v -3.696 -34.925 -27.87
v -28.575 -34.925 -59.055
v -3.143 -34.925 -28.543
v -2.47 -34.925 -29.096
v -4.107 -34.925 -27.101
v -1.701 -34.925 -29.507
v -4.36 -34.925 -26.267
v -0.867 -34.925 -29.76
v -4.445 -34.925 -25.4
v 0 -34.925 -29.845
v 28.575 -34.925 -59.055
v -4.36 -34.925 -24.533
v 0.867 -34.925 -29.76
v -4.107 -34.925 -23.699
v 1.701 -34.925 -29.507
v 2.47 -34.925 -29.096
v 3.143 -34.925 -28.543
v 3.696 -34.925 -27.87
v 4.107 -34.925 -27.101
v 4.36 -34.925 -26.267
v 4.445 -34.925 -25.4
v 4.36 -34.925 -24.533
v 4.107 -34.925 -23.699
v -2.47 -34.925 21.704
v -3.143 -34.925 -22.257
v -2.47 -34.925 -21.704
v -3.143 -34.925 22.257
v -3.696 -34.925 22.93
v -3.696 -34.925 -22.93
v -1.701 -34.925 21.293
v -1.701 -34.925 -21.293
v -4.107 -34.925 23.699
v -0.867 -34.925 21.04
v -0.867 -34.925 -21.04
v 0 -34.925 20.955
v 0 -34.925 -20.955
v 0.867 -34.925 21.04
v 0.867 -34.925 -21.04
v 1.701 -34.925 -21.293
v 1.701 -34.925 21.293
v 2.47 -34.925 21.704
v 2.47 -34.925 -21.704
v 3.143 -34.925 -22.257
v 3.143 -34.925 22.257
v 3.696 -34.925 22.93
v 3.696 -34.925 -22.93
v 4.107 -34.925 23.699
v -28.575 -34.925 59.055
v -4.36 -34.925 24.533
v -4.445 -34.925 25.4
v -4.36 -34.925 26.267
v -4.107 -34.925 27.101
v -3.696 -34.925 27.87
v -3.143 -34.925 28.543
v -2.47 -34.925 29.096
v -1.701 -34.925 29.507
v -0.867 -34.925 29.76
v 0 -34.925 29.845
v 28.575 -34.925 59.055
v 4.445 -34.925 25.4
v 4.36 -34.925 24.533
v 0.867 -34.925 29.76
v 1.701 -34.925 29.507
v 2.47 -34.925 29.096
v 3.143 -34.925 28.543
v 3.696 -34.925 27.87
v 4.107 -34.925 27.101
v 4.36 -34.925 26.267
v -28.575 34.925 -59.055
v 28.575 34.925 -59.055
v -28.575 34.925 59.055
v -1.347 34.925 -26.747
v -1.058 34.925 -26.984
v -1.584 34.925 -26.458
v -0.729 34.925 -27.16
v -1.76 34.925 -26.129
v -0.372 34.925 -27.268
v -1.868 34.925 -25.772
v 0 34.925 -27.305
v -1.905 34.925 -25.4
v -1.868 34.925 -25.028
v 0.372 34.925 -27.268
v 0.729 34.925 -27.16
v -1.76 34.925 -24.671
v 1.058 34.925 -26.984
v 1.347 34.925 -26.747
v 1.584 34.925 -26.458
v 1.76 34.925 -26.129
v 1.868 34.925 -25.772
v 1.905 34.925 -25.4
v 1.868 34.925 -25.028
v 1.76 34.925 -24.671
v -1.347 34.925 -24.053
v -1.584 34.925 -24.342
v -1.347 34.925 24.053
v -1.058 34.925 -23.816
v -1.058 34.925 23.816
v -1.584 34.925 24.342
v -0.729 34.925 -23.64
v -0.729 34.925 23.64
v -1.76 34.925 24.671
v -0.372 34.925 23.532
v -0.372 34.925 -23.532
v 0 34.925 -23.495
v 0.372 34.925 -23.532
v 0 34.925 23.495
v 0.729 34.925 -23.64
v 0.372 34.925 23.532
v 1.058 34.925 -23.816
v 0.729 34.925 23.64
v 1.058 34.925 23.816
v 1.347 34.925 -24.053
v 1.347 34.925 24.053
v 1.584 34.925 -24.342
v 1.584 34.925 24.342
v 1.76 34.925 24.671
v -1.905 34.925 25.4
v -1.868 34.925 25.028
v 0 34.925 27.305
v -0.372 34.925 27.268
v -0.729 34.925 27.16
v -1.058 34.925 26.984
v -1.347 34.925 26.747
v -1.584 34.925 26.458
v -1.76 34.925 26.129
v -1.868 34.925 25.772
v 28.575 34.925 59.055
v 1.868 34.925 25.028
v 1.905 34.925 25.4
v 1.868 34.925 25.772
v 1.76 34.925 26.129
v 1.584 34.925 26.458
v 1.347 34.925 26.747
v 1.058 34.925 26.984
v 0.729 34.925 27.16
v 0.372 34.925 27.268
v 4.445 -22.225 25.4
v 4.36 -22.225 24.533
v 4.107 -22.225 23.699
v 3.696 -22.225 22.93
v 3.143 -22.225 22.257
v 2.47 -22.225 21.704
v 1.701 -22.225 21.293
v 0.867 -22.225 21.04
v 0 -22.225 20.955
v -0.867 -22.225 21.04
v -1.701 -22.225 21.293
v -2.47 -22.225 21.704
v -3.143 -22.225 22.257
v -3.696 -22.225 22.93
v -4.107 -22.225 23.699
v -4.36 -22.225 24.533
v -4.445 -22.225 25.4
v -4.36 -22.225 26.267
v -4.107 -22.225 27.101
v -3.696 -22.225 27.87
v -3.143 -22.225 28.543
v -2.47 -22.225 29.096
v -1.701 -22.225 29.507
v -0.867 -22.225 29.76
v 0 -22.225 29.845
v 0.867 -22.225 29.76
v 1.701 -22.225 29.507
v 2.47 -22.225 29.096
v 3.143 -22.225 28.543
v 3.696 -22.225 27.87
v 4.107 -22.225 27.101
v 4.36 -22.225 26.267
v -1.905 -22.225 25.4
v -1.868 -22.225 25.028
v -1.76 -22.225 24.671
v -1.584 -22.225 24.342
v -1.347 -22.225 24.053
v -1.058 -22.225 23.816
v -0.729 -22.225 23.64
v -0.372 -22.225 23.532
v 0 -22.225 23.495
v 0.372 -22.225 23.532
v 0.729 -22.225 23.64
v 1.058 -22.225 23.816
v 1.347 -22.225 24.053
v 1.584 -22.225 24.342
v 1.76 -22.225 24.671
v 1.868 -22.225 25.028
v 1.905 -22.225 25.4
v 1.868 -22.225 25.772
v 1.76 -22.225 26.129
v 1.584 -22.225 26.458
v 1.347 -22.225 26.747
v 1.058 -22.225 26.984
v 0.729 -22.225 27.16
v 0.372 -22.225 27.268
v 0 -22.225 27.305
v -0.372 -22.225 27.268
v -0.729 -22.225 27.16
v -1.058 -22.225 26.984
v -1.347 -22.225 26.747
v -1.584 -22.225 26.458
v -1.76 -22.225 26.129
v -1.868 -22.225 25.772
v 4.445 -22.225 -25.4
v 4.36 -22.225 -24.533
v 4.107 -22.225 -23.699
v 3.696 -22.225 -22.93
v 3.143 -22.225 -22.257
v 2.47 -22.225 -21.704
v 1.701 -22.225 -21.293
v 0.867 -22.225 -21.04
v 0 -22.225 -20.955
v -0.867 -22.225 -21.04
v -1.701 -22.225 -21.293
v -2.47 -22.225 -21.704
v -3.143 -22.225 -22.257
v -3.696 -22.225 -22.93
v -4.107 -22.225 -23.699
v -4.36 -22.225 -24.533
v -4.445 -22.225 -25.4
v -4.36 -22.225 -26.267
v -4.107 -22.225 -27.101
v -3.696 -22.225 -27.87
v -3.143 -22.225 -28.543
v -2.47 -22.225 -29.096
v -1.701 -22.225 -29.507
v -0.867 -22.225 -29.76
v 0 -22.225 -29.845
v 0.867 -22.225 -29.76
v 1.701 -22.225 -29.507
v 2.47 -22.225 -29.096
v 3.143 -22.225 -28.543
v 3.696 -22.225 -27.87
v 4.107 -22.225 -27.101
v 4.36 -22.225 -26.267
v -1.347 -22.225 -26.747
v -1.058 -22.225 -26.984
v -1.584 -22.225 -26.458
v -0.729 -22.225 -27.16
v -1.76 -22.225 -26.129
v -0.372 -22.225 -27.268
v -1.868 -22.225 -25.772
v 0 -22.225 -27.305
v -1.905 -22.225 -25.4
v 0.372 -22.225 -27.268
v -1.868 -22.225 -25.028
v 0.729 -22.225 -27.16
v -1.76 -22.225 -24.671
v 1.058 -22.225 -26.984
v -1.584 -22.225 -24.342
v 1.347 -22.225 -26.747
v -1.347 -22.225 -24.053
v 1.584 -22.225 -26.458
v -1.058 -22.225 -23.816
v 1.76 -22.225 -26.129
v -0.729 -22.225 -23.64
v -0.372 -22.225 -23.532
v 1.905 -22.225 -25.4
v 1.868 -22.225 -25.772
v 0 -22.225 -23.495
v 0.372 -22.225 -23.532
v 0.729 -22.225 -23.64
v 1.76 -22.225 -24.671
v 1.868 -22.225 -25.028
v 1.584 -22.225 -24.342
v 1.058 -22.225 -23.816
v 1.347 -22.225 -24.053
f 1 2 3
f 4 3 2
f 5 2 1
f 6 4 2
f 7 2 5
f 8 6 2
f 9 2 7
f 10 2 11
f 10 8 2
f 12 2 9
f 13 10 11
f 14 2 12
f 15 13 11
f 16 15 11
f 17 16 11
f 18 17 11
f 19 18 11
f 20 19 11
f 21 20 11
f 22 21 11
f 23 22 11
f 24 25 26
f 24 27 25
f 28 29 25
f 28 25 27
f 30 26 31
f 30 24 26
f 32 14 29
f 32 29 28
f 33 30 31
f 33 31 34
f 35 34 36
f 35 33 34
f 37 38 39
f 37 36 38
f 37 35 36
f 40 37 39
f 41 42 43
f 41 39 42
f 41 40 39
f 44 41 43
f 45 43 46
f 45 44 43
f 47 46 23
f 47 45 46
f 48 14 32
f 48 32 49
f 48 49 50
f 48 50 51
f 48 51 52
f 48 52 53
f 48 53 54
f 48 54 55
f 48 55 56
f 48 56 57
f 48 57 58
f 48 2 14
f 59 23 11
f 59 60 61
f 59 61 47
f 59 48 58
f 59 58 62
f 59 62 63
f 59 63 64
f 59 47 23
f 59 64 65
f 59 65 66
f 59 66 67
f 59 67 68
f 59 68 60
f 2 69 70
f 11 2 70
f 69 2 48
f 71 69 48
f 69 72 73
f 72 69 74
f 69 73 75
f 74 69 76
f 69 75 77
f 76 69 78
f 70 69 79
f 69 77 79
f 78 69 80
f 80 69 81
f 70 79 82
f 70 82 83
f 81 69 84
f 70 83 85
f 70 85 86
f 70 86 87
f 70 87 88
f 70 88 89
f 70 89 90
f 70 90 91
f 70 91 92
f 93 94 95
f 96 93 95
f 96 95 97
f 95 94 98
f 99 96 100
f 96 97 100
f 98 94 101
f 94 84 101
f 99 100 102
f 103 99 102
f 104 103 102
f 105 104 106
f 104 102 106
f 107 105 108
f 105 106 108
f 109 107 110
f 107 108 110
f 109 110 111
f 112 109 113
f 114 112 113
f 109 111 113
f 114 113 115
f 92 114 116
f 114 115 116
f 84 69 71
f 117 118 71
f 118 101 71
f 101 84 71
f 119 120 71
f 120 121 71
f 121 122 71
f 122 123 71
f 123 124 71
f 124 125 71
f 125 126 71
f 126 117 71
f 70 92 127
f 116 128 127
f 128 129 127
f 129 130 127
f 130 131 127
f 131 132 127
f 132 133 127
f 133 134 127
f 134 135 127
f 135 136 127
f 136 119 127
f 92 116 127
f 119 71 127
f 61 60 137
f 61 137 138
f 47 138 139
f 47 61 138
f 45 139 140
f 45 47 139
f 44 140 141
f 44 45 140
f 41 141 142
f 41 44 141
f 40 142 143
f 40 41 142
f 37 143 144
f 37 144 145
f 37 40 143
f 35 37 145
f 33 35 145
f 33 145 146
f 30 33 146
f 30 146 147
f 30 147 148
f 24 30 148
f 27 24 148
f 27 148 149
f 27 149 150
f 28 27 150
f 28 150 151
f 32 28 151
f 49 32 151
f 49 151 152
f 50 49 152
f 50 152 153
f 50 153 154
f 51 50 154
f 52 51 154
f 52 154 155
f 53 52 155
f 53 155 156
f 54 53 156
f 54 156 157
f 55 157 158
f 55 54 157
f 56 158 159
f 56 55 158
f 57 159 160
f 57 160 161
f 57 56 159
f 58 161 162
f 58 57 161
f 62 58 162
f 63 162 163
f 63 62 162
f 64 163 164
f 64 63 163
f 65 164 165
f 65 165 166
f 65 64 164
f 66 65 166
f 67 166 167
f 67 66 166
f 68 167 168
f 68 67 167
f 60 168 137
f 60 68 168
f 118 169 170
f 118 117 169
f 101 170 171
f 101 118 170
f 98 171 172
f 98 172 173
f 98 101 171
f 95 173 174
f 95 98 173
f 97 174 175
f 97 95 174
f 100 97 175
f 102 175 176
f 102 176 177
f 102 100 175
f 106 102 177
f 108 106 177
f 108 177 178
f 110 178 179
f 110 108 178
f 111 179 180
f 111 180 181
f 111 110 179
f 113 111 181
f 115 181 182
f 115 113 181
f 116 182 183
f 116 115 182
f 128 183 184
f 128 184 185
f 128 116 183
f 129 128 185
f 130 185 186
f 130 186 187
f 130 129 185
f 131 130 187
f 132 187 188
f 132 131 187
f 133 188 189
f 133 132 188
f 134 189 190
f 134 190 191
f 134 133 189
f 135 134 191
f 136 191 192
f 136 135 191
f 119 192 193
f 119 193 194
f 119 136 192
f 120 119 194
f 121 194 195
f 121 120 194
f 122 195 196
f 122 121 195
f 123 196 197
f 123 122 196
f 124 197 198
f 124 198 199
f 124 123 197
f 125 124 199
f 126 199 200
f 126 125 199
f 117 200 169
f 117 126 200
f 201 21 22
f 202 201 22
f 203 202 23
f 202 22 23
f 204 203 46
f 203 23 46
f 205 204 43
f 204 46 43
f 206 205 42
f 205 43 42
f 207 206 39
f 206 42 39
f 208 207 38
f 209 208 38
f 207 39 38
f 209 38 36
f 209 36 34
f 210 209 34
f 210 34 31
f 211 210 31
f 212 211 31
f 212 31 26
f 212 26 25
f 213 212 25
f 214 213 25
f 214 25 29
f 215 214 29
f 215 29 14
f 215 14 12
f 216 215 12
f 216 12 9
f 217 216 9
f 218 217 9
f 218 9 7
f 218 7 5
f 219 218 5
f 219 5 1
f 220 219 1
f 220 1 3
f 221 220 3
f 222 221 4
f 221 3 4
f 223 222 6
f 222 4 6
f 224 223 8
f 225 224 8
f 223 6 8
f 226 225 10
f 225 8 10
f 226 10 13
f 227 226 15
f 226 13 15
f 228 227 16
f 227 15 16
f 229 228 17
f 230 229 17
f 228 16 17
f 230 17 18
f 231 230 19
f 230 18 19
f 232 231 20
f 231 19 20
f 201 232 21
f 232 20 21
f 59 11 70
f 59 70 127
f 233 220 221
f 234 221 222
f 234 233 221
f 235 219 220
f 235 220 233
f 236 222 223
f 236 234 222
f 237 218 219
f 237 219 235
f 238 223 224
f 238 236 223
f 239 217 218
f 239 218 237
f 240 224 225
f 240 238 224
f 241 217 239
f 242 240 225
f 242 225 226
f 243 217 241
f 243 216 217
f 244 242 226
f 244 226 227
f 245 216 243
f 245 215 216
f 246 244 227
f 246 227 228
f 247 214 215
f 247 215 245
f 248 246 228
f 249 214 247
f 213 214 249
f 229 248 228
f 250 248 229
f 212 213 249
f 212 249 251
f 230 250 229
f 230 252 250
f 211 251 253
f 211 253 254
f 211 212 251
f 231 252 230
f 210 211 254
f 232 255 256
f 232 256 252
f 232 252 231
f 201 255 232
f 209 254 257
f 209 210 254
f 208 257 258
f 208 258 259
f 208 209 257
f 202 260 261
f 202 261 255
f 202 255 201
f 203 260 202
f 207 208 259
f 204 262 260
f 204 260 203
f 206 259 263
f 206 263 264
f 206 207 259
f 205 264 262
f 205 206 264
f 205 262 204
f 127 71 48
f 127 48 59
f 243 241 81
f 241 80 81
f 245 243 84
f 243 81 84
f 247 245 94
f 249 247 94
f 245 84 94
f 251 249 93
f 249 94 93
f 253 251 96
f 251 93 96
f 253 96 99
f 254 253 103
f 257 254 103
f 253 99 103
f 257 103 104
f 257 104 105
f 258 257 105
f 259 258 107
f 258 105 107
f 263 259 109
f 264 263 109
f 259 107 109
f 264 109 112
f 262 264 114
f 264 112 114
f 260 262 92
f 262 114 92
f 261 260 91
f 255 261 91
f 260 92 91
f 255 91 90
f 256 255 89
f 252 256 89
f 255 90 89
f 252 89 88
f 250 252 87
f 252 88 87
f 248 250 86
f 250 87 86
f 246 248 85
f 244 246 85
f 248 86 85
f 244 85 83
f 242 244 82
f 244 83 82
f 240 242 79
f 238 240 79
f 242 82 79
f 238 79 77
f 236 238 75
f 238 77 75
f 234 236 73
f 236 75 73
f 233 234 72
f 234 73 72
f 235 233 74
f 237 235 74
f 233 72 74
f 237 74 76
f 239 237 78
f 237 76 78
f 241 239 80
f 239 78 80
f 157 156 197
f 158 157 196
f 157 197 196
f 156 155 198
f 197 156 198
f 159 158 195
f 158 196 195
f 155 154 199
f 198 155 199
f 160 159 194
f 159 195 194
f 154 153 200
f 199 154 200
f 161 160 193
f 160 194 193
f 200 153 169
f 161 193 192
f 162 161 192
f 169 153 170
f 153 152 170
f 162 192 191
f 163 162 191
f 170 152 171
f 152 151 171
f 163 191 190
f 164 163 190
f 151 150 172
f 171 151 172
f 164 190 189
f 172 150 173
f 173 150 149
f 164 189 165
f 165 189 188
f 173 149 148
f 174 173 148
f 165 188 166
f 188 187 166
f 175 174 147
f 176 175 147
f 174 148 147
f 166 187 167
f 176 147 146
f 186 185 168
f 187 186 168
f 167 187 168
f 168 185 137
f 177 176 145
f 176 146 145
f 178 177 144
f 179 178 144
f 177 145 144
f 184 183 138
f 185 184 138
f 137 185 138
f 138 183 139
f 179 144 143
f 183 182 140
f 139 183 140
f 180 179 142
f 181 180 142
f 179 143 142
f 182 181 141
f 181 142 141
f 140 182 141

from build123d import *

# Parameters (mm, degrees)
F1_W           = 57.15
F1_H           = 118.11
F2_DEPTH       = 34.925
F4_D           = 3.81
F4_CBORE_D     = 8.89
F4_CBORE_DEPTH = 12.7


with BuildPart() as f2:
    # F1 (on Front) → F2 (new body, symmetric)
    with BuildSketch(Plane.XZ):
        Rectangle(F1_W, F1_H)
    extrude(amount=F2_DEPTH, both=True)

    # F4 (through all)
    with Locations(Plane.XZ.offset(34.925)):
        with Locations((0, -25.4)):
            CounterBoreHole(F4_D / 2, F4_CBORE_D / 2, F4_CBORE_DEPTH)

    # F5: F2 across plane


with BuildPart() as f2_1:
    add(f2.part)
    add(f2.part.mirror(Plane.XY), mode=Mode.INTERSECT)


solid = f2_1.part
